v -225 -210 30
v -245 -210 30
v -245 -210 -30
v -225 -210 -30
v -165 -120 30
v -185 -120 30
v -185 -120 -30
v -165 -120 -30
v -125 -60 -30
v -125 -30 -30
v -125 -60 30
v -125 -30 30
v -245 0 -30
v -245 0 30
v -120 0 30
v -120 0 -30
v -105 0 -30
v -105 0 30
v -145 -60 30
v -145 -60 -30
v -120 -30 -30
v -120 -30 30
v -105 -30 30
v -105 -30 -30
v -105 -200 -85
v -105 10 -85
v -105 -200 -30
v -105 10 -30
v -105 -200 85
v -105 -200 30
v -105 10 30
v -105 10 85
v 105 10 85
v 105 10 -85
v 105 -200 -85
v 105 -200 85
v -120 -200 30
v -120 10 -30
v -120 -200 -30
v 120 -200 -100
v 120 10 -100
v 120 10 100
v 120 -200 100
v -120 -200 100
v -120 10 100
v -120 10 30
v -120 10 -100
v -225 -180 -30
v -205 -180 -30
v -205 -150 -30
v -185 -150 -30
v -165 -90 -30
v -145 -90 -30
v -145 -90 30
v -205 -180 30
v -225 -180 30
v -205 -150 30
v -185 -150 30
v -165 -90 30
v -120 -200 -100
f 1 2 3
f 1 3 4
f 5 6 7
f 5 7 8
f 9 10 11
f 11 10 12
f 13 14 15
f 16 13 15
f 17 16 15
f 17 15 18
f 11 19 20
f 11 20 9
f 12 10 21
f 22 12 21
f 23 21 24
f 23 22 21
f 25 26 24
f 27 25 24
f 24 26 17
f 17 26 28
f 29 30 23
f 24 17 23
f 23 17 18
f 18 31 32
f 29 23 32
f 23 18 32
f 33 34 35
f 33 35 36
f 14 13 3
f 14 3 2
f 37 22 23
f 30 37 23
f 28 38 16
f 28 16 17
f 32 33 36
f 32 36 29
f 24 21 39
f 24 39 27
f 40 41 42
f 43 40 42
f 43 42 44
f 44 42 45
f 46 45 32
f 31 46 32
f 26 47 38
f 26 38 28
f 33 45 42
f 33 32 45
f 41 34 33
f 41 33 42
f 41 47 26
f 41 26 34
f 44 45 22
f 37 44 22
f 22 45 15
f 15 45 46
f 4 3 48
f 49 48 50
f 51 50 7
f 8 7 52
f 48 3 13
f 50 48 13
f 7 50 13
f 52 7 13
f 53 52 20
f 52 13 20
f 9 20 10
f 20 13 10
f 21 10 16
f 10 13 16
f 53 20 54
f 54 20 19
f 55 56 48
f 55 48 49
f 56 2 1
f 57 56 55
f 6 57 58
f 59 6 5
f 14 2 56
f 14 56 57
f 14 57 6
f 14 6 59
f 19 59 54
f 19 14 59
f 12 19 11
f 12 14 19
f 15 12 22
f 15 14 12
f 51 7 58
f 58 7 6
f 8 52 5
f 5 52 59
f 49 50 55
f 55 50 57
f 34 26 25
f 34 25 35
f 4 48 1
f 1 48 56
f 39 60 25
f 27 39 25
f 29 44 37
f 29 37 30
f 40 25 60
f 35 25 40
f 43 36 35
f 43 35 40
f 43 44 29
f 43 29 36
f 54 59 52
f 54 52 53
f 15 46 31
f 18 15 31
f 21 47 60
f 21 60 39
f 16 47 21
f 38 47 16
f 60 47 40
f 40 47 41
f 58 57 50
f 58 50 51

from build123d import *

# Parameters (mm, degrees)
F1_DEPTH = 200
F2_DEPTH = 10
F3_DEPTH = 30
F0_W     = 20
F0_H     = 60
F4_DEPTH = 60
F5_DEPTH = 90
F6_DEPTH = 120
F7_DEPTH = 150
F8_DEPTH = 180
F9_DEPTH = 210


with BuildPart() as f1:
    # F0 (on Front) → F1 (new body)
    with BuildSketch(Plane.XZ):
        Polygon((120, 100), (-120, 100), (-120, 30), (-105, 30), (-105, 85), (105, 85), (105, -85), (-105, -85), (-105, -30), (-120, -30), (-120, -100), (120, -100), align=None)
    extrude(amount=F1_DEPTH)

    # F1_face (on face) → F2 (join, symmetric)
    with BuildSketch(Plane(origin=(8.881579, 0, 0), x_dir=(1, 0, 0), z_dir=(0, 1, 0))):
        Polygon((-128.881579, -100), (111.118421, -100), (111.118421, 100), (-128.881579, 100), (-128.881579, 30), (-113.881579, 30), (-113.881579, 85), (96.118421, 85), (96.118421, -85), (-113.881579, -85), (-113.881579, -30), (-128.881579, -30), align=None)
    extrude(amount=F2_DEPTH, both=True)

    # F0 (on Front) → F3 (join)
    with BuildSketch(Plane.XZ):
        Polygon((-105, 30), (-120, 30), (-125, 30), (-125, -30), (-120, -30), (-105, -30), align=None)
    extrude(amount=F3_DEPTH)

    # F0 (on Front) → F4 (join)
    with BuildSketch(Plane.XZ):
        with Locations((-135, 0)):
            Rectangle(F0_W, F0_H)
    extrude(amount=F4_DEPTH)

    # F0 (on Front) → F5 (join)
    with BuildSketch(Plane.XZ):
        with Locations((-155, 0)):
            Rectangle(F0_W, F0_H)
    extrude(amount=F5_DEPTH)

    # F0 (on Front) → F6 (join)
    with BuildSketch(Plane.XZ):
        with Locations((-175, 0)):
            Rectangle(F0_W, F0_H)
    extrude(amount=F6_DEPTH)

    # F0 (on Front) → F7 (join)
    with BuildSketch(Plane.XZ):
        with Locations((-195, 0)):
            Rectangle(F0_W, F0_H)
    extrude(amount=F7_DEPTH)

    # F0 (on Front) → F8 (join)
    with BuildSketch(Plane.XZ):
        with Locations((-215, 0)):
            Rectangle(F0_W, F0_H)
    extrude(amount=F8_DEPTH)

    # F0 (on Front) → F9 (join)
    with BuildSketch(Plane.XZ):
        with Locations((-235, 0)):
            Rectangle(F0_W, F0_H)
    extrude(amount=F9_DEPTH)


solid = f1.part
